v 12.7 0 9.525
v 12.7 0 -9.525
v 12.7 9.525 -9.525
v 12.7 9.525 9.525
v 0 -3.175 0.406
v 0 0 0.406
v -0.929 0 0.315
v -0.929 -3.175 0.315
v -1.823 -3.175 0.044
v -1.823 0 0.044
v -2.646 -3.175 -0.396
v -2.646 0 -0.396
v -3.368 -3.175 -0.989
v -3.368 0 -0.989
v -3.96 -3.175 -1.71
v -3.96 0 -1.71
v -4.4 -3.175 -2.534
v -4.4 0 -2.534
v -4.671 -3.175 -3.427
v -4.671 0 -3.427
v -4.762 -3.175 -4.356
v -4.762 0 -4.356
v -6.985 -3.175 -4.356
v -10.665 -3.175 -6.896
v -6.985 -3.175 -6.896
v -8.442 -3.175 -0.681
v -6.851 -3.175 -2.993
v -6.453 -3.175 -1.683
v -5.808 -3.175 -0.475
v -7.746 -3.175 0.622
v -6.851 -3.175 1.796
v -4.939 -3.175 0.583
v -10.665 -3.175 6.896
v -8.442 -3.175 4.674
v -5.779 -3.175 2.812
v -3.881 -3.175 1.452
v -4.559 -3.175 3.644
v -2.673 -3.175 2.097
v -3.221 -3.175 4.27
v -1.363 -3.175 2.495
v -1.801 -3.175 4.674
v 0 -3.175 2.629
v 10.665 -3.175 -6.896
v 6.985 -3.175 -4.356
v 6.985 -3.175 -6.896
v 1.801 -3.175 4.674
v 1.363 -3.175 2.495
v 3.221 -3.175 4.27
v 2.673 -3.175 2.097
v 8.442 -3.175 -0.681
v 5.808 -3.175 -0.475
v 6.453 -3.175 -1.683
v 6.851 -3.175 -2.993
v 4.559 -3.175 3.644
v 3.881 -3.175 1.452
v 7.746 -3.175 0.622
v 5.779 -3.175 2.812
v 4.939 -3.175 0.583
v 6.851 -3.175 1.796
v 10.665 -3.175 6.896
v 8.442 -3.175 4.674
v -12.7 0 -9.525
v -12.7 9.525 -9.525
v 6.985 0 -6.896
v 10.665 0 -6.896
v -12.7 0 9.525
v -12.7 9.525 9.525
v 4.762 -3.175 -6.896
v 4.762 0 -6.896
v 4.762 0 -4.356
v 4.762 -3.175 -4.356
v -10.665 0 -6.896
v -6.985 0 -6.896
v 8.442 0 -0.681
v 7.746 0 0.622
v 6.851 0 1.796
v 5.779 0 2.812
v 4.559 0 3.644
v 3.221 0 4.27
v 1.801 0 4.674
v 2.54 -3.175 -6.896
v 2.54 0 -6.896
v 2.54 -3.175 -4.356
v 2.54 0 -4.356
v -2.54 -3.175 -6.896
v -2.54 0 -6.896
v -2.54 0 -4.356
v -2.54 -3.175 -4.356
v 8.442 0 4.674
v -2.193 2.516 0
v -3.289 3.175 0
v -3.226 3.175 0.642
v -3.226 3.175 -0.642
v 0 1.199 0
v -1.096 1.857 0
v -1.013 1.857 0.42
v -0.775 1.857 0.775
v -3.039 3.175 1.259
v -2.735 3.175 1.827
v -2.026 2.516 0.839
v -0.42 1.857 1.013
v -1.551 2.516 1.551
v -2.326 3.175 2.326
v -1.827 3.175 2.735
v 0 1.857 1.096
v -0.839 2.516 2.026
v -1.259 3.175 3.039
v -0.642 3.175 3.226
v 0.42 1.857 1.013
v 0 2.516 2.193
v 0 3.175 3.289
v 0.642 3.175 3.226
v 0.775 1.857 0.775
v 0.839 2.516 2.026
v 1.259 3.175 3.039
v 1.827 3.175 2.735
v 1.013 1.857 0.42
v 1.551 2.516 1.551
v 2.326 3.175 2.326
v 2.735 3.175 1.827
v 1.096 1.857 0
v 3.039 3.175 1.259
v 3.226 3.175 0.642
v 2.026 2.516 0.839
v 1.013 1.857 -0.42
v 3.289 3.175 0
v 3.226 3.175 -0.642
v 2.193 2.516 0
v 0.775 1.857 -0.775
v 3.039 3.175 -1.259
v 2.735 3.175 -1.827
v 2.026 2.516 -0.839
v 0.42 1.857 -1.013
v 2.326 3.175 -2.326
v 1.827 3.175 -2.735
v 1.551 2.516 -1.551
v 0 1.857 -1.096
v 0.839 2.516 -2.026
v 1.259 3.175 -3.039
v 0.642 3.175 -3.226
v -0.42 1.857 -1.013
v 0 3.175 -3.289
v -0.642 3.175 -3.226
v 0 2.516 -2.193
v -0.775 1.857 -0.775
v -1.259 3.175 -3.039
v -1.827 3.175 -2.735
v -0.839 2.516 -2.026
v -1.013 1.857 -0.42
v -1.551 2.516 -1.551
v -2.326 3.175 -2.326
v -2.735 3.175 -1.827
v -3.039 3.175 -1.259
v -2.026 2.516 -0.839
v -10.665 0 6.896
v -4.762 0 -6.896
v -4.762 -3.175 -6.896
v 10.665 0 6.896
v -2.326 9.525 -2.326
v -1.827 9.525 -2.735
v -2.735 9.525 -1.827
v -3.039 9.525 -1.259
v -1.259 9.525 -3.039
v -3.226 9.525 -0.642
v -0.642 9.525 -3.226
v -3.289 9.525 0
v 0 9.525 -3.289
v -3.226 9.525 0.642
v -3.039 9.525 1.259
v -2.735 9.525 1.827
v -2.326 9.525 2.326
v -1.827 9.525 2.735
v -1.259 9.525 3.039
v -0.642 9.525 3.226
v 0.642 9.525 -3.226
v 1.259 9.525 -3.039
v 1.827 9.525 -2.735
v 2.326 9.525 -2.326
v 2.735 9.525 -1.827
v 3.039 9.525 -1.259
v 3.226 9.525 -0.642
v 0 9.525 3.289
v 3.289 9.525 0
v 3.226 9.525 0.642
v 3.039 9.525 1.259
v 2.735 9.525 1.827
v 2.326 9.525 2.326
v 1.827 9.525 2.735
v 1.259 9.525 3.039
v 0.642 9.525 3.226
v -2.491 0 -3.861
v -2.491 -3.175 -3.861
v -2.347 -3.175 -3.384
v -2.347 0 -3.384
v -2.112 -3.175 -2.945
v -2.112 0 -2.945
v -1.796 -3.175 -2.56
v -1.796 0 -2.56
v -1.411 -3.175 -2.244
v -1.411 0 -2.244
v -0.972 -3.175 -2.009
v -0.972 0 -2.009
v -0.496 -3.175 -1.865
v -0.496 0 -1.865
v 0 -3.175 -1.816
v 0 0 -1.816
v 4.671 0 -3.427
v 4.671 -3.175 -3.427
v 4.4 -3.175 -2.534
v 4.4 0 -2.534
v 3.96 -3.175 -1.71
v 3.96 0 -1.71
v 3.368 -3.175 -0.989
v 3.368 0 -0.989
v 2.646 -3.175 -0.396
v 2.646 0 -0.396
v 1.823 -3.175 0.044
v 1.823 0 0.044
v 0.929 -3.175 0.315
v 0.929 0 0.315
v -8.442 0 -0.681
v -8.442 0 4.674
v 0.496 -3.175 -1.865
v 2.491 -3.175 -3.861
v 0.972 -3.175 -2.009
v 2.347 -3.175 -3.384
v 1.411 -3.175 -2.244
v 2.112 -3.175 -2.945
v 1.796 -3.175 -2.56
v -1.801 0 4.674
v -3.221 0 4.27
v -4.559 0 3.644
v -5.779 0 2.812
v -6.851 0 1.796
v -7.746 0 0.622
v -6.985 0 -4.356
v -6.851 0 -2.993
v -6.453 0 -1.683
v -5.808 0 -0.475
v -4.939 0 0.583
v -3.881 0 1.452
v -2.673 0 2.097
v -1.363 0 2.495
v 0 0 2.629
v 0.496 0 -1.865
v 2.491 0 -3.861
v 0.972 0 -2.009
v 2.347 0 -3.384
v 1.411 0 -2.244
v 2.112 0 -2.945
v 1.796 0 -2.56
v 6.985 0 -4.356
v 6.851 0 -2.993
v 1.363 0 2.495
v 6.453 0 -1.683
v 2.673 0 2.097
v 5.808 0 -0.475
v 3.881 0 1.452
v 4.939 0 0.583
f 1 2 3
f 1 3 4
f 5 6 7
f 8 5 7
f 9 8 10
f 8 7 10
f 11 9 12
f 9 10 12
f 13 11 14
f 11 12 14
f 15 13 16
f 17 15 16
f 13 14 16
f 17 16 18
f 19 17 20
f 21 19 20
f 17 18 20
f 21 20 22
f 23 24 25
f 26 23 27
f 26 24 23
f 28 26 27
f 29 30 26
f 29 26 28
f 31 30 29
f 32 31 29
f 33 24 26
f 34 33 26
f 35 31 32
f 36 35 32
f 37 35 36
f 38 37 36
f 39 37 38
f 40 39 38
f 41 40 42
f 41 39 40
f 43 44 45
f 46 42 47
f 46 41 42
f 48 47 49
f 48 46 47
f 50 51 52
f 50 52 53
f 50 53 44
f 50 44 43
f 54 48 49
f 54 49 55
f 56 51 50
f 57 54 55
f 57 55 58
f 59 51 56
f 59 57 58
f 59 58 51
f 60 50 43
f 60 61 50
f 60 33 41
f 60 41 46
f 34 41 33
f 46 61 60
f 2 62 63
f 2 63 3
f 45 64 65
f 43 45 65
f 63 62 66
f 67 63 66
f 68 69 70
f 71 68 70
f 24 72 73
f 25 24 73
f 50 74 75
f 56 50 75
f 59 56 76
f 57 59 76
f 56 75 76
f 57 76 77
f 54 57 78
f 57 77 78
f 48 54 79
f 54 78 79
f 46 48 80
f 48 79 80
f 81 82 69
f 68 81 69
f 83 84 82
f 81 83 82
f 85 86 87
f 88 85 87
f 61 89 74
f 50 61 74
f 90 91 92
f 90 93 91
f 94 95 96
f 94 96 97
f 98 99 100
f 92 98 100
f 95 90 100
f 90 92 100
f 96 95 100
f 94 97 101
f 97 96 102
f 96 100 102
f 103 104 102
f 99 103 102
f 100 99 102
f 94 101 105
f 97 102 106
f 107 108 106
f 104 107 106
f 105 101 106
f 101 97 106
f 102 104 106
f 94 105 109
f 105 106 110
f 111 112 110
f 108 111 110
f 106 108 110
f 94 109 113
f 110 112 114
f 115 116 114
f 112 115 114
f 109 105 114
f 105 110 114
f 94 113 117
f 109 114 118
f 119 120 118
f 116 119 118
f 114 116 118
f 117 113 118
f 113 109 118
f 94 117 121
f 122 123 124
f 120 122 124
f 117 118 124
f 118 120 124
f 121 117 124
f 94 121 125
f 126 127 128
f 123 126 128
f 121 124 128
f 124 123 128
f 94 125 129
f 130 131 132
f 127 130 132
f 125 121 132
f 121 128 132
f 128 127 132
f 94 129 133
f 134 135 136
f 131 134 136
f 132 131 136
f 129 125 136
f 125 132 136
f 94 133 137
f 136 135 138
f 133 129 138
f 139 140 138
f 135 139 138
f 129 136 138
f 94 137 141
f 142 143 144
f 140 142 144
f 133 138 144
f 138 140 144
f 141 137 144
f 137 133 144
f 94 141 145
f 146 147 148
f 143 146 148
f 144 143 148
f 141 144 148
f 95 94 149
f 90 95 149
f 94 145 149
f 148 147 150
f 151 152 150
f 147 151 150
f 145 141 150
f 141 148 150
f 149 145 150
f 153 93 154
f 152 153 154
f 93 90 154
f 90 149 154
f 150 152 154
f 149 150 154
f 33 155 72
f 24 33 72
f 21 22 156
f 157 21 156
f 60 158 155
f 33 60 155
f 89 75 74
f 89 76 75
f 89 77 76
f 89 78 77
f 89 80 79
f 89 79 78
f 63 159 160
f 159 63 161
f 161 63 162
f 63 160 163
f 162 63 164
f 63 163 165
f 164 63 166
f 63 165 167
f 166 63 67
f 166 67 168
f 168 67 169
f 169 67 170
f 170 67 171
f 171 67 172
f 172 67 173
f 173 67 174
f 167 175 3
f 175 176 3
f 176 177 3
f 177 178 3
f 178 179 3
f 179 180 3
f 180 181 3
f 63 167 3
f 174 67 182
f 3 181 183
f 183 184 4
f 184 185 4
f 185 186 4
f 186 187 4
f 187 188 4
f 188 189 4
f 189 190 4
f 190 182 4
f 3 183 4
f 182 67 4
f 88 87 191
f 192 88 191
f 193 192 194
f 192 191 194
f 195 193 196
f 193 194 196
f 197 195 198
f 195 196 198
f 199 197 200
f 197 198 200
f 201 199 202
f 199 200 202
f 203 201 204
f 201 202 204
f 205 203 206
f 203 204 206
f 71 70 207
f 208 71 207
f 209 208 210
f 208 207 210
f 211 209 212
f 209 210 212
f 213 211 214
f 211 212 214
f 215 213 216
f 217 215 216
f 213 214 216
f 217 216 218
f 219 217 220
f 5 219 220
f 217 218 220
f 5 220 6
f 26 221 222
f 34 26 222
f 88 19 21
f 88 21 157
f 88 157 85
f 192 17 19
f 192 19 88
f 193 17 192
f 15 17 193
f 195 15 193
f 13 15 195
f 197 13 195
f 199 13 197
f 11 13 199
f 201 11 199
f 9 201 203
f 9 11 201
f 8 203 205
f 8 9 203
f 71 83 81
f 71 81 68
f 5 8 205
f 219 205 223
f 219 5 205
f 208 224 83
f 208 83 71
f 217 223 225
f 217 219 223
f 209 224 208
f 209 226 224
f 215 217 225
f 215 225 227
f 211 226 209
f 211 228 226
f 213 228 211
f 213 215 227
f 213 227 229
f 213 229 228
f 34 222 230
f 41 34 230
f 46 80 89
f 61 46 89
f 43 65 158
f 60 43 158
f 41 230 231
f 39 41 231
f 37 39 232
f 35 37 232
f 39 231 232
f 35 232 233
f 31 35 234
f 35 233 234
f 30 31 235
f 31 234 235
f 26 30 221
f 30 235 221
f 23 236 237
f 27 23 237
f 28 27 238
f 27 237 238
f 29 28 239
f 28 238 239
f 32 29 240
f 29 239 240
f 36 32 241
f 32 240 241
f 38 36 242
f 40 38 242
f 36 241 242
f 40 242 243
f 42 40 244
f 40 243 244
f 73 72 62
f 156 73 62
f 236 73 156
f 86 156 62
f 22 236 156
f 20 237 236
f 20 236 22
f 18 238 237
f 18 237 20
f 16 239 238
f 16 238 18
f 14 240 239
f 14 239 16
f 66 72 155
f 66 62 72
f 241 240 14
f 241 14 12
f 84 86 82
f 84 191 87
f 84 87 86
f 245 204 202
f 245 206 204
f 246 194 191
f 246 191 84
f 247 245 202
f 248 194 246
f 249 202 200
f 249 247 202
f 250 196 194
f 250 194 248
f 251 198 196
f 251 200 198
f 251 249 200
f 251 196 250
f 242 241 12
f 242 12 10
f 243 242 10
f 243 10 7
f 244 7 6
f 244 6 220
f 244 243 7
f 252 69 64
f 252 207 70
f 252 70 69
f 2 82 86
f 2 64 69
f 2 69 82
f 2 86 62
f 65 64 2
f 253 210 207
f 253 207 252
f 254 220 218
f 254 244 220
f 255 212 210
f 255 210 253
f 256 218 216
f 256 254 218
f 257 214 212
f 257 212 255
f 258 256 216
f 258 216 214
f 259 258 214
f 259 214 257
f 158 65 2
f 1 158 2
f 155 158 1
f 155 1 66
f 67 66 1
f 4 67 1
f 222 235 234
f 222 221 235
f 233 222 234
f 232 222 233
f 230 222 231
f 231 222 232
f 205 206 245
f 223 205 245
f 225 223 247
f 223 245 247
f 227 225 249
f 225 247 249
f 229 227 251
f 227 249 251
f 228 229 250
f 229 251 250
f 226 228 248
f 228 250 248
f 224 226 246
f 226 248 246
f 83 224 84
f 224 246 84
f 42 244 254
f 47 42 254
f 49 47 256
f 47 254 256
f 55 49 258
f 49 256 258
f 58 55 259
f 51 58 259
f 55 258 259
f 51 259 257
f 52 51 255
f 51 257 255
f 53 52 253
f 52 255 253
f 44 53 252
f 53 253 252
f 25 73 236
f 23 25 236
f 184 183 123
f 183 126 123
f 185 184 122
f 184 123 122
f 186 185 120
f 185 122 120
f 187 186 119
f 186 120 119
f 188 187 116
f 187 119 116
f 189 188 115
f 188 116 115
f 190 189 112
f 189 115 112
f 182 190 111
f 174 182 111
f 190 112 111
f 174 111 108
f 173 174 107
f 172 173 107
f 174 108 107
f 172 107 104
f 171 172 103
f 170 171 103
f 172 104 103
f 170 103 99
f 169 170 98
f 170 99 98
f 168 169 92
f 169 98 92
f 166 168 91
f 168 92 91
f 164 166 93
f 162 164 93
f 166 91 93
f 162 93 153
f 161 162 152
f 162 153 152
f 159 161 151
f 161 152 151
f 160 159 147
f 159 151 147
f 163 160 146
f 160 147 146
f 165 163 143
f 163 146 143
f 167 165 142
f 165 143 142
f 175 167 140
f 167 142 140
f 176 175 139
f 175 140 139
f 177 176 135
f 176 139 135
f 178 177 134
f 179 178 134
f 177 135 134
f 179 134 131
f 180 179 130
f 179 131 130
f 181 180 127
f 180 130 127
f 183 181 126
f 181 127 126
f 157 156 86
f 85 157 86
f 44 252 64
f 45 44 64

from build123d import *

# Parameters (mm, degrees)
F0_W     = 25.4
F0_H     = 19.05
F1_DEPTH = 9.525
F3_DEPTH = 3.175
F5_D     = 6.5786
F5_DEPTH = 6.35
F5_TIP   = 1.9764108342


with BuildPart() as f1:
    # F0 (on Front) → F1 (new body)
    with BuildSketch(Plane.XZ):
        Rectangle(F0_W, F0_H)
    extrude(amount=-F1_DEPTH)

    # F2 (on face) → F3 (join)
    with BuildSketch(Plane.XZ):
        with BuildLine():
            Line((10.6646052337, 6.8961), (0, 6.8961))
            Line((0, 6.8961), (-10.6646052337, 6.8961))
            Line((-10.6646052337, 6.8961), (-10.6646052337, -6.8961))
            Line((-10.6646052337, -6.8961), (-6.985, -6.8961))
            Line((-6.985, -6.8961), (-6.985, -4.3561))
            ThreePointArc((-6.985, -4.3561), (-4.9391408666, 0.5830408666), (0, 2.6289))
            ThreePointArc((0, 2.6289), (4.9391408666, 0.5830408666), (6.985, -4.3561))
            Line((6.985, -4.3561), (6.985, -6.8961))
            Line((6.985, -6.8961), (10.6646052337, -6.8961))
            Line((10.6646052337, -6.8961), (10.6646052337, 6.8961))
        make_face()
        with BuildLine():
            ThreePointArc((-1.8007149025, 4.6736), (-5.7789138794, 2.8120385746), (-8.4421052337, -0.6806523438))
            Line((-8.4421052337, -0.6806523438), (-8.4421052337, 4.6736))
            Line((-8.4421052337, 4.6736), (-1.8007149025, 4.6736))
        make_face(mode=Mode.SUBTRACT)
        with BuildLine():
            ThreePointArc((8.4421052337, -0.6806523438), (5.7789138794, 2.8120385746), (1.8007149025, 4.6736))
            Line((1.8007149025, 4.6736), (8.4421052337, 4.6736))
            Line((8.4421052337, 4.6736), (8.4421052337, -0.6806523438))
        make_face(mode=Mode.SUBTRACT)
        with BuildLine():
            Line((2.54, -4.3561), (2.54, -6.8961))
            Line((2.54, -6.8961), (4.7625, -6.8961))
            Line((4.7625, -6.8961), (4.7625, -4.3561))
            ThreePointArc((4.7625, -4.3561), (3.3675960454, -0.9885039546), (0, 0.4064))
            ThreePointArc((0, 0.4064), (-3.3675960454, -0.9885039546), (-4.7625, -4.3561))
            Line((-4.7625, -4.3561), (-4.7625, -6.8961))
            Line((-4.7625, -6.8961), (-2.54, -6.8961))
            Line((-2.54, -6.8961), (-2.54, -4.3561))
            ThreePointArc((-2.54, -4.3561), (-1.7960512242, -2.5600487758), (0, -1.8161))
            ThreePointArc((0, -1.8161), (1.7960512242, -2.5600487758), (2.54, -4.3561))
        make_face()
    extrude(amount=F3_DEPTH)

    # F5
    with Locations(Plane(origin=(0, 9.525, 0), x_dir=(-1, 0, 0), z_dir=(0, 1, 0))):
        with Locations((0, 0)):
            Hole(F5_D / 2, depth=F5_DEPTH)
            with Locations((0, 0, -(F5_DEPTH + F5_TIP / 2))):  # 118° drill point
                Cone(0, F5_D / 2, F5_TIP, mode=Mode.SUBTRACT)


solid = f1.part
